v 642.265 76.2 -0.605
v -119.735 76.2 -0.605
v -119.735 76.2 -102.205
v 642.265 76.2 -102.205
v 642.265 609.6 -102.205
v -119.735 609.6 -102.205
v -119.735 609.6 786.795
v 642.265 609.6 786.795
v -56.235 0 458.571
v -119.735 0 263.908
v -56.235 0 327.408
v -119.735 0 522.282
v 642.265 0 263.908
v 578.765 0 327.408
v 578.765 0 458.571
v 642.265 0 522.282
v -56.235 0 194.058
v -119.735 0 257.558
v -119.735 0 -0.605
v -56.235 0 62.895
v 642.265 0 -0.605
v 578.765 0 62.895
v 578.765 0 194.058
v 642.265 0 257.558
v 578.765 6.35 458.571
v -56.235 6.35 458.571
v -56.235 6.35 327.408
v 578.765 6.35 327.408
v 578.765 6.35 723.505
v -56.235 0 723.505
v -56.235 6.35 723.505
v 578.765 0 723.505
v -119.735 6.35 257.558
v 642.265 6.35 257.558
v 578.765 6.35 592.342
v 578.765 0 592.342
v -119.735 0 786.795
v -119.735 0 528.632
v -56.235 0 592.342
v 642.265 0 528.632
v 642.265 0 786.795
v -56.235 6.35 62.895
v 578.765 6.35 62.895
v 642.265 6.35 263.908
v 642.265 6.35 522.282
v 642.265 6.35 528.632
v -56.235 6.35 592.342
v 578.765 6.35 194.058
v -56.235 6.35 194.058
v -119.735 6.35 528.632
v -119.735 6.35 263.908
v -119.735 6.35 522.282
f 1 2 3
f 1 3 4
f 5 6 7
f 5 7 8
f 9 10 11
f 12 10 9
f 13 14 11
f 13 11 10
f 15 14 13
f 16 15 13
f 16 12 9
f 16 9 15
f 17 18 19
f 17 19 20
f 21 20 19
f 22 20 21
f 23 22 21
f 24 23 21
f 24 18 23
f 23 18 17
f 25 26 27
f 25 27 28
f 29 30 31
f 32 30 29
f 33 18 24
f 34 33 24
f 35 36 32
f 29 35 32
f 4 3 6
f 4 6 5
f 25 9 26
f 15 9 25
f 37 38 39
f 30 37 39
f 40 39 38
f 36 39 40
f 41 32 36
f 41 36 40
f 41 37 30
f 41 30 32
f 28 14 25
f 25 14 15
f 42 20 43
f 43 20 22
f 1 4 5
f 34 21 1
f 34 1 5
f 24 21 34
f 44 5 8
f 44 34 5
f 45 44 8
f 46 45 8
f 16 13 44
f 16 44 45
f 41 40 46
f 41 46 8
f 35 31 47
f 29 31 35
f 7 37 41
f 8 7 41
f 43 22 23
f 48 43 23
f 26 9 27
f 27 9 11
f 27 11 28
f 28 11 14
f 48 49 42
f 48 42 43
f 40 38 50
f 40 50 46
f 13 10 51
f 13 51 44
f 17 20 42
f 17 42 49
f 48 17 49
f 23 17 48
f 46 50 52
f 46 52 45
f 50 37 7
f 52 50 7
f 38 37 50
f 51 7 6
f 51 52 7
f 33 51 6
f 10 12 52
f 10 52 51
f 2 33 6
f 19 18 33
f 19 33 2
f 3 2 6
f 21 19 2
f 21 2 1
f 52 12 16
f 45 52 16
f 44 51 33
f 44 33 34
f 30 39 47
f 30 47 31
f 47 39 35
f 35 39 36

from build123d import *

# Parameters (mm, degrees)
F0_W     = 762
F0_H     = 101.6
F0_H_2   = 258.16306
F0_W_2   = 635
F0_H_3   = 131.16306
F0_H_4   = 3.175
F0_H_5   = 65.47612
F0_H_6   = 65.68694
F1_DEPTH = 609.6
F2_DEPTH = 6.35
F3_DEPTH = 76.2


# Not quite as in the source:
# - a feature names something its author has since deleted; it is built from what else it names


with BuildPart() as f1:
    # F0 (on Front) → F1 (new body)
    with BuildSketch(Plane.XZ):
        with Locations((261.2652602196, -51.4053403184)):
            Rectangle(F0_W, F0_H)
        with Locations((261.2652602196, 128.4761896816)):
            Rectangle(F0_W, F0_H_2)
        with Locations((261.2652602196, 128.4761896816)):
            Rectangle(F0_W_2, F0_H_3, mode=Mode.SUBTRACT)
        with Locations((261.2652602196, 259.1452196816)):
            Rectangle(F0_W, F0_H_4)
        with Locations((261.2652602196, 262.3202196816)):
            Rectangle(F0_W, F0_H_4)
        Polygon((-119.7347397804, 263.9077196816), (642.2652602196, 263.9077196816), (642.2652602196, 393.0946596816), (578.7652602196, 393.0946596816), (578.7652602196, 327.4077196816), (-56.2347397804, 327.4077196816), (-56.2347397804, 393.0946596816), (-119.7347397804, 393.0946596816), align=None)
        Polygon((578.7652602196, 393.0946596816), (642.2652602196, 393.0946596816), (642.2652602196, 522.2815996816), (-119.7347397804, 522.2815996816), (-119.7347397804, 393.0946596816), (-56.2347397804, 393.0946596816), (-56.2347397804, 458.5707796816), (578.7652602196, 458.5707796816), align=None)
        with Locations((261.2652602196, 523.8690996816)):
            Rectangle(F0_W, F0_H_4)
        with Locations((261.2652602196, 527.0440996816)):
            Rectangle(F0_W, F0_H_4)
        with Locations((261.2652602196, 657.7131296816)):
            Rectangle(F0_W, F0_H_2)
        with Locations((261.2652602196, 657.9239496816)):
            Rectangle(F0_W_2, F0_H_3, mode=Mode.SUBTRACT)
        with Locations((261.2652602196, 657.9239496816)):
            Rectangle(F0_W_2, F0_H_3)
        with Locations((261.2652602196, 425.8327196816)):
            Rectangle(F0_W_2, F0_H_5)
        with Locations((261.2652602196, 360.2511896816)):
            Rectangle(F0_W_2, F0_H_6)
        with Locations((261.2652602196, 128.4761896816)):
            Rectangle(F0_W_2, F0_H_3)
    extrude(amount=-F1_DEPTH)

    # F0 (on Front) → F2 (cut)
    with BuildSketch(Plane.XZ):
        with Locations((261.2652602196, 657.9239496816)):
            Rectangle(F0_W_2, F0_H_3)
        with Locations((261.2652602196, 425.8327196816)):
            Rectangle(F0_W_2, F0_H_5)
        with Locations((261.2652602196, 360.2511896816)):
            Rectangle(F0_W_2, F0_H_6)
        with Locations((261.2652602196, 128.4761896816)):
            Rectangle(F0_W_2, F0_H_3)
        with Locations((261.2652602196, 262.3202196816)):
            Rectangle(F0_W, F0_H_4)
        with Locations((261.2652602196, 259.1452196816)):
            Rectangle(F0_W, F0_H_4)
        with Locations((261.2652602196, 527.0440996816)):
            Rectangle(F0_W, F0_H_4)
        with Locations((261.2652602196, 523.8690996816)):
            Rectangle(F0_W, F0_H_4)
    extrude(amount=-F2_DEPTH, mode=Mode.SUBTRACT)

    # F0 (on Front) → F3 (cut)
    with BuildSketch(Plane.XZ):
        with Locations((261.2652602196, -51.4053403184)):
            Rectangle(F0_W, F0_H)
    extrude(amount=-F3_DEPTH, mode=Mode.SUBTRACT)


solid = f1.part
